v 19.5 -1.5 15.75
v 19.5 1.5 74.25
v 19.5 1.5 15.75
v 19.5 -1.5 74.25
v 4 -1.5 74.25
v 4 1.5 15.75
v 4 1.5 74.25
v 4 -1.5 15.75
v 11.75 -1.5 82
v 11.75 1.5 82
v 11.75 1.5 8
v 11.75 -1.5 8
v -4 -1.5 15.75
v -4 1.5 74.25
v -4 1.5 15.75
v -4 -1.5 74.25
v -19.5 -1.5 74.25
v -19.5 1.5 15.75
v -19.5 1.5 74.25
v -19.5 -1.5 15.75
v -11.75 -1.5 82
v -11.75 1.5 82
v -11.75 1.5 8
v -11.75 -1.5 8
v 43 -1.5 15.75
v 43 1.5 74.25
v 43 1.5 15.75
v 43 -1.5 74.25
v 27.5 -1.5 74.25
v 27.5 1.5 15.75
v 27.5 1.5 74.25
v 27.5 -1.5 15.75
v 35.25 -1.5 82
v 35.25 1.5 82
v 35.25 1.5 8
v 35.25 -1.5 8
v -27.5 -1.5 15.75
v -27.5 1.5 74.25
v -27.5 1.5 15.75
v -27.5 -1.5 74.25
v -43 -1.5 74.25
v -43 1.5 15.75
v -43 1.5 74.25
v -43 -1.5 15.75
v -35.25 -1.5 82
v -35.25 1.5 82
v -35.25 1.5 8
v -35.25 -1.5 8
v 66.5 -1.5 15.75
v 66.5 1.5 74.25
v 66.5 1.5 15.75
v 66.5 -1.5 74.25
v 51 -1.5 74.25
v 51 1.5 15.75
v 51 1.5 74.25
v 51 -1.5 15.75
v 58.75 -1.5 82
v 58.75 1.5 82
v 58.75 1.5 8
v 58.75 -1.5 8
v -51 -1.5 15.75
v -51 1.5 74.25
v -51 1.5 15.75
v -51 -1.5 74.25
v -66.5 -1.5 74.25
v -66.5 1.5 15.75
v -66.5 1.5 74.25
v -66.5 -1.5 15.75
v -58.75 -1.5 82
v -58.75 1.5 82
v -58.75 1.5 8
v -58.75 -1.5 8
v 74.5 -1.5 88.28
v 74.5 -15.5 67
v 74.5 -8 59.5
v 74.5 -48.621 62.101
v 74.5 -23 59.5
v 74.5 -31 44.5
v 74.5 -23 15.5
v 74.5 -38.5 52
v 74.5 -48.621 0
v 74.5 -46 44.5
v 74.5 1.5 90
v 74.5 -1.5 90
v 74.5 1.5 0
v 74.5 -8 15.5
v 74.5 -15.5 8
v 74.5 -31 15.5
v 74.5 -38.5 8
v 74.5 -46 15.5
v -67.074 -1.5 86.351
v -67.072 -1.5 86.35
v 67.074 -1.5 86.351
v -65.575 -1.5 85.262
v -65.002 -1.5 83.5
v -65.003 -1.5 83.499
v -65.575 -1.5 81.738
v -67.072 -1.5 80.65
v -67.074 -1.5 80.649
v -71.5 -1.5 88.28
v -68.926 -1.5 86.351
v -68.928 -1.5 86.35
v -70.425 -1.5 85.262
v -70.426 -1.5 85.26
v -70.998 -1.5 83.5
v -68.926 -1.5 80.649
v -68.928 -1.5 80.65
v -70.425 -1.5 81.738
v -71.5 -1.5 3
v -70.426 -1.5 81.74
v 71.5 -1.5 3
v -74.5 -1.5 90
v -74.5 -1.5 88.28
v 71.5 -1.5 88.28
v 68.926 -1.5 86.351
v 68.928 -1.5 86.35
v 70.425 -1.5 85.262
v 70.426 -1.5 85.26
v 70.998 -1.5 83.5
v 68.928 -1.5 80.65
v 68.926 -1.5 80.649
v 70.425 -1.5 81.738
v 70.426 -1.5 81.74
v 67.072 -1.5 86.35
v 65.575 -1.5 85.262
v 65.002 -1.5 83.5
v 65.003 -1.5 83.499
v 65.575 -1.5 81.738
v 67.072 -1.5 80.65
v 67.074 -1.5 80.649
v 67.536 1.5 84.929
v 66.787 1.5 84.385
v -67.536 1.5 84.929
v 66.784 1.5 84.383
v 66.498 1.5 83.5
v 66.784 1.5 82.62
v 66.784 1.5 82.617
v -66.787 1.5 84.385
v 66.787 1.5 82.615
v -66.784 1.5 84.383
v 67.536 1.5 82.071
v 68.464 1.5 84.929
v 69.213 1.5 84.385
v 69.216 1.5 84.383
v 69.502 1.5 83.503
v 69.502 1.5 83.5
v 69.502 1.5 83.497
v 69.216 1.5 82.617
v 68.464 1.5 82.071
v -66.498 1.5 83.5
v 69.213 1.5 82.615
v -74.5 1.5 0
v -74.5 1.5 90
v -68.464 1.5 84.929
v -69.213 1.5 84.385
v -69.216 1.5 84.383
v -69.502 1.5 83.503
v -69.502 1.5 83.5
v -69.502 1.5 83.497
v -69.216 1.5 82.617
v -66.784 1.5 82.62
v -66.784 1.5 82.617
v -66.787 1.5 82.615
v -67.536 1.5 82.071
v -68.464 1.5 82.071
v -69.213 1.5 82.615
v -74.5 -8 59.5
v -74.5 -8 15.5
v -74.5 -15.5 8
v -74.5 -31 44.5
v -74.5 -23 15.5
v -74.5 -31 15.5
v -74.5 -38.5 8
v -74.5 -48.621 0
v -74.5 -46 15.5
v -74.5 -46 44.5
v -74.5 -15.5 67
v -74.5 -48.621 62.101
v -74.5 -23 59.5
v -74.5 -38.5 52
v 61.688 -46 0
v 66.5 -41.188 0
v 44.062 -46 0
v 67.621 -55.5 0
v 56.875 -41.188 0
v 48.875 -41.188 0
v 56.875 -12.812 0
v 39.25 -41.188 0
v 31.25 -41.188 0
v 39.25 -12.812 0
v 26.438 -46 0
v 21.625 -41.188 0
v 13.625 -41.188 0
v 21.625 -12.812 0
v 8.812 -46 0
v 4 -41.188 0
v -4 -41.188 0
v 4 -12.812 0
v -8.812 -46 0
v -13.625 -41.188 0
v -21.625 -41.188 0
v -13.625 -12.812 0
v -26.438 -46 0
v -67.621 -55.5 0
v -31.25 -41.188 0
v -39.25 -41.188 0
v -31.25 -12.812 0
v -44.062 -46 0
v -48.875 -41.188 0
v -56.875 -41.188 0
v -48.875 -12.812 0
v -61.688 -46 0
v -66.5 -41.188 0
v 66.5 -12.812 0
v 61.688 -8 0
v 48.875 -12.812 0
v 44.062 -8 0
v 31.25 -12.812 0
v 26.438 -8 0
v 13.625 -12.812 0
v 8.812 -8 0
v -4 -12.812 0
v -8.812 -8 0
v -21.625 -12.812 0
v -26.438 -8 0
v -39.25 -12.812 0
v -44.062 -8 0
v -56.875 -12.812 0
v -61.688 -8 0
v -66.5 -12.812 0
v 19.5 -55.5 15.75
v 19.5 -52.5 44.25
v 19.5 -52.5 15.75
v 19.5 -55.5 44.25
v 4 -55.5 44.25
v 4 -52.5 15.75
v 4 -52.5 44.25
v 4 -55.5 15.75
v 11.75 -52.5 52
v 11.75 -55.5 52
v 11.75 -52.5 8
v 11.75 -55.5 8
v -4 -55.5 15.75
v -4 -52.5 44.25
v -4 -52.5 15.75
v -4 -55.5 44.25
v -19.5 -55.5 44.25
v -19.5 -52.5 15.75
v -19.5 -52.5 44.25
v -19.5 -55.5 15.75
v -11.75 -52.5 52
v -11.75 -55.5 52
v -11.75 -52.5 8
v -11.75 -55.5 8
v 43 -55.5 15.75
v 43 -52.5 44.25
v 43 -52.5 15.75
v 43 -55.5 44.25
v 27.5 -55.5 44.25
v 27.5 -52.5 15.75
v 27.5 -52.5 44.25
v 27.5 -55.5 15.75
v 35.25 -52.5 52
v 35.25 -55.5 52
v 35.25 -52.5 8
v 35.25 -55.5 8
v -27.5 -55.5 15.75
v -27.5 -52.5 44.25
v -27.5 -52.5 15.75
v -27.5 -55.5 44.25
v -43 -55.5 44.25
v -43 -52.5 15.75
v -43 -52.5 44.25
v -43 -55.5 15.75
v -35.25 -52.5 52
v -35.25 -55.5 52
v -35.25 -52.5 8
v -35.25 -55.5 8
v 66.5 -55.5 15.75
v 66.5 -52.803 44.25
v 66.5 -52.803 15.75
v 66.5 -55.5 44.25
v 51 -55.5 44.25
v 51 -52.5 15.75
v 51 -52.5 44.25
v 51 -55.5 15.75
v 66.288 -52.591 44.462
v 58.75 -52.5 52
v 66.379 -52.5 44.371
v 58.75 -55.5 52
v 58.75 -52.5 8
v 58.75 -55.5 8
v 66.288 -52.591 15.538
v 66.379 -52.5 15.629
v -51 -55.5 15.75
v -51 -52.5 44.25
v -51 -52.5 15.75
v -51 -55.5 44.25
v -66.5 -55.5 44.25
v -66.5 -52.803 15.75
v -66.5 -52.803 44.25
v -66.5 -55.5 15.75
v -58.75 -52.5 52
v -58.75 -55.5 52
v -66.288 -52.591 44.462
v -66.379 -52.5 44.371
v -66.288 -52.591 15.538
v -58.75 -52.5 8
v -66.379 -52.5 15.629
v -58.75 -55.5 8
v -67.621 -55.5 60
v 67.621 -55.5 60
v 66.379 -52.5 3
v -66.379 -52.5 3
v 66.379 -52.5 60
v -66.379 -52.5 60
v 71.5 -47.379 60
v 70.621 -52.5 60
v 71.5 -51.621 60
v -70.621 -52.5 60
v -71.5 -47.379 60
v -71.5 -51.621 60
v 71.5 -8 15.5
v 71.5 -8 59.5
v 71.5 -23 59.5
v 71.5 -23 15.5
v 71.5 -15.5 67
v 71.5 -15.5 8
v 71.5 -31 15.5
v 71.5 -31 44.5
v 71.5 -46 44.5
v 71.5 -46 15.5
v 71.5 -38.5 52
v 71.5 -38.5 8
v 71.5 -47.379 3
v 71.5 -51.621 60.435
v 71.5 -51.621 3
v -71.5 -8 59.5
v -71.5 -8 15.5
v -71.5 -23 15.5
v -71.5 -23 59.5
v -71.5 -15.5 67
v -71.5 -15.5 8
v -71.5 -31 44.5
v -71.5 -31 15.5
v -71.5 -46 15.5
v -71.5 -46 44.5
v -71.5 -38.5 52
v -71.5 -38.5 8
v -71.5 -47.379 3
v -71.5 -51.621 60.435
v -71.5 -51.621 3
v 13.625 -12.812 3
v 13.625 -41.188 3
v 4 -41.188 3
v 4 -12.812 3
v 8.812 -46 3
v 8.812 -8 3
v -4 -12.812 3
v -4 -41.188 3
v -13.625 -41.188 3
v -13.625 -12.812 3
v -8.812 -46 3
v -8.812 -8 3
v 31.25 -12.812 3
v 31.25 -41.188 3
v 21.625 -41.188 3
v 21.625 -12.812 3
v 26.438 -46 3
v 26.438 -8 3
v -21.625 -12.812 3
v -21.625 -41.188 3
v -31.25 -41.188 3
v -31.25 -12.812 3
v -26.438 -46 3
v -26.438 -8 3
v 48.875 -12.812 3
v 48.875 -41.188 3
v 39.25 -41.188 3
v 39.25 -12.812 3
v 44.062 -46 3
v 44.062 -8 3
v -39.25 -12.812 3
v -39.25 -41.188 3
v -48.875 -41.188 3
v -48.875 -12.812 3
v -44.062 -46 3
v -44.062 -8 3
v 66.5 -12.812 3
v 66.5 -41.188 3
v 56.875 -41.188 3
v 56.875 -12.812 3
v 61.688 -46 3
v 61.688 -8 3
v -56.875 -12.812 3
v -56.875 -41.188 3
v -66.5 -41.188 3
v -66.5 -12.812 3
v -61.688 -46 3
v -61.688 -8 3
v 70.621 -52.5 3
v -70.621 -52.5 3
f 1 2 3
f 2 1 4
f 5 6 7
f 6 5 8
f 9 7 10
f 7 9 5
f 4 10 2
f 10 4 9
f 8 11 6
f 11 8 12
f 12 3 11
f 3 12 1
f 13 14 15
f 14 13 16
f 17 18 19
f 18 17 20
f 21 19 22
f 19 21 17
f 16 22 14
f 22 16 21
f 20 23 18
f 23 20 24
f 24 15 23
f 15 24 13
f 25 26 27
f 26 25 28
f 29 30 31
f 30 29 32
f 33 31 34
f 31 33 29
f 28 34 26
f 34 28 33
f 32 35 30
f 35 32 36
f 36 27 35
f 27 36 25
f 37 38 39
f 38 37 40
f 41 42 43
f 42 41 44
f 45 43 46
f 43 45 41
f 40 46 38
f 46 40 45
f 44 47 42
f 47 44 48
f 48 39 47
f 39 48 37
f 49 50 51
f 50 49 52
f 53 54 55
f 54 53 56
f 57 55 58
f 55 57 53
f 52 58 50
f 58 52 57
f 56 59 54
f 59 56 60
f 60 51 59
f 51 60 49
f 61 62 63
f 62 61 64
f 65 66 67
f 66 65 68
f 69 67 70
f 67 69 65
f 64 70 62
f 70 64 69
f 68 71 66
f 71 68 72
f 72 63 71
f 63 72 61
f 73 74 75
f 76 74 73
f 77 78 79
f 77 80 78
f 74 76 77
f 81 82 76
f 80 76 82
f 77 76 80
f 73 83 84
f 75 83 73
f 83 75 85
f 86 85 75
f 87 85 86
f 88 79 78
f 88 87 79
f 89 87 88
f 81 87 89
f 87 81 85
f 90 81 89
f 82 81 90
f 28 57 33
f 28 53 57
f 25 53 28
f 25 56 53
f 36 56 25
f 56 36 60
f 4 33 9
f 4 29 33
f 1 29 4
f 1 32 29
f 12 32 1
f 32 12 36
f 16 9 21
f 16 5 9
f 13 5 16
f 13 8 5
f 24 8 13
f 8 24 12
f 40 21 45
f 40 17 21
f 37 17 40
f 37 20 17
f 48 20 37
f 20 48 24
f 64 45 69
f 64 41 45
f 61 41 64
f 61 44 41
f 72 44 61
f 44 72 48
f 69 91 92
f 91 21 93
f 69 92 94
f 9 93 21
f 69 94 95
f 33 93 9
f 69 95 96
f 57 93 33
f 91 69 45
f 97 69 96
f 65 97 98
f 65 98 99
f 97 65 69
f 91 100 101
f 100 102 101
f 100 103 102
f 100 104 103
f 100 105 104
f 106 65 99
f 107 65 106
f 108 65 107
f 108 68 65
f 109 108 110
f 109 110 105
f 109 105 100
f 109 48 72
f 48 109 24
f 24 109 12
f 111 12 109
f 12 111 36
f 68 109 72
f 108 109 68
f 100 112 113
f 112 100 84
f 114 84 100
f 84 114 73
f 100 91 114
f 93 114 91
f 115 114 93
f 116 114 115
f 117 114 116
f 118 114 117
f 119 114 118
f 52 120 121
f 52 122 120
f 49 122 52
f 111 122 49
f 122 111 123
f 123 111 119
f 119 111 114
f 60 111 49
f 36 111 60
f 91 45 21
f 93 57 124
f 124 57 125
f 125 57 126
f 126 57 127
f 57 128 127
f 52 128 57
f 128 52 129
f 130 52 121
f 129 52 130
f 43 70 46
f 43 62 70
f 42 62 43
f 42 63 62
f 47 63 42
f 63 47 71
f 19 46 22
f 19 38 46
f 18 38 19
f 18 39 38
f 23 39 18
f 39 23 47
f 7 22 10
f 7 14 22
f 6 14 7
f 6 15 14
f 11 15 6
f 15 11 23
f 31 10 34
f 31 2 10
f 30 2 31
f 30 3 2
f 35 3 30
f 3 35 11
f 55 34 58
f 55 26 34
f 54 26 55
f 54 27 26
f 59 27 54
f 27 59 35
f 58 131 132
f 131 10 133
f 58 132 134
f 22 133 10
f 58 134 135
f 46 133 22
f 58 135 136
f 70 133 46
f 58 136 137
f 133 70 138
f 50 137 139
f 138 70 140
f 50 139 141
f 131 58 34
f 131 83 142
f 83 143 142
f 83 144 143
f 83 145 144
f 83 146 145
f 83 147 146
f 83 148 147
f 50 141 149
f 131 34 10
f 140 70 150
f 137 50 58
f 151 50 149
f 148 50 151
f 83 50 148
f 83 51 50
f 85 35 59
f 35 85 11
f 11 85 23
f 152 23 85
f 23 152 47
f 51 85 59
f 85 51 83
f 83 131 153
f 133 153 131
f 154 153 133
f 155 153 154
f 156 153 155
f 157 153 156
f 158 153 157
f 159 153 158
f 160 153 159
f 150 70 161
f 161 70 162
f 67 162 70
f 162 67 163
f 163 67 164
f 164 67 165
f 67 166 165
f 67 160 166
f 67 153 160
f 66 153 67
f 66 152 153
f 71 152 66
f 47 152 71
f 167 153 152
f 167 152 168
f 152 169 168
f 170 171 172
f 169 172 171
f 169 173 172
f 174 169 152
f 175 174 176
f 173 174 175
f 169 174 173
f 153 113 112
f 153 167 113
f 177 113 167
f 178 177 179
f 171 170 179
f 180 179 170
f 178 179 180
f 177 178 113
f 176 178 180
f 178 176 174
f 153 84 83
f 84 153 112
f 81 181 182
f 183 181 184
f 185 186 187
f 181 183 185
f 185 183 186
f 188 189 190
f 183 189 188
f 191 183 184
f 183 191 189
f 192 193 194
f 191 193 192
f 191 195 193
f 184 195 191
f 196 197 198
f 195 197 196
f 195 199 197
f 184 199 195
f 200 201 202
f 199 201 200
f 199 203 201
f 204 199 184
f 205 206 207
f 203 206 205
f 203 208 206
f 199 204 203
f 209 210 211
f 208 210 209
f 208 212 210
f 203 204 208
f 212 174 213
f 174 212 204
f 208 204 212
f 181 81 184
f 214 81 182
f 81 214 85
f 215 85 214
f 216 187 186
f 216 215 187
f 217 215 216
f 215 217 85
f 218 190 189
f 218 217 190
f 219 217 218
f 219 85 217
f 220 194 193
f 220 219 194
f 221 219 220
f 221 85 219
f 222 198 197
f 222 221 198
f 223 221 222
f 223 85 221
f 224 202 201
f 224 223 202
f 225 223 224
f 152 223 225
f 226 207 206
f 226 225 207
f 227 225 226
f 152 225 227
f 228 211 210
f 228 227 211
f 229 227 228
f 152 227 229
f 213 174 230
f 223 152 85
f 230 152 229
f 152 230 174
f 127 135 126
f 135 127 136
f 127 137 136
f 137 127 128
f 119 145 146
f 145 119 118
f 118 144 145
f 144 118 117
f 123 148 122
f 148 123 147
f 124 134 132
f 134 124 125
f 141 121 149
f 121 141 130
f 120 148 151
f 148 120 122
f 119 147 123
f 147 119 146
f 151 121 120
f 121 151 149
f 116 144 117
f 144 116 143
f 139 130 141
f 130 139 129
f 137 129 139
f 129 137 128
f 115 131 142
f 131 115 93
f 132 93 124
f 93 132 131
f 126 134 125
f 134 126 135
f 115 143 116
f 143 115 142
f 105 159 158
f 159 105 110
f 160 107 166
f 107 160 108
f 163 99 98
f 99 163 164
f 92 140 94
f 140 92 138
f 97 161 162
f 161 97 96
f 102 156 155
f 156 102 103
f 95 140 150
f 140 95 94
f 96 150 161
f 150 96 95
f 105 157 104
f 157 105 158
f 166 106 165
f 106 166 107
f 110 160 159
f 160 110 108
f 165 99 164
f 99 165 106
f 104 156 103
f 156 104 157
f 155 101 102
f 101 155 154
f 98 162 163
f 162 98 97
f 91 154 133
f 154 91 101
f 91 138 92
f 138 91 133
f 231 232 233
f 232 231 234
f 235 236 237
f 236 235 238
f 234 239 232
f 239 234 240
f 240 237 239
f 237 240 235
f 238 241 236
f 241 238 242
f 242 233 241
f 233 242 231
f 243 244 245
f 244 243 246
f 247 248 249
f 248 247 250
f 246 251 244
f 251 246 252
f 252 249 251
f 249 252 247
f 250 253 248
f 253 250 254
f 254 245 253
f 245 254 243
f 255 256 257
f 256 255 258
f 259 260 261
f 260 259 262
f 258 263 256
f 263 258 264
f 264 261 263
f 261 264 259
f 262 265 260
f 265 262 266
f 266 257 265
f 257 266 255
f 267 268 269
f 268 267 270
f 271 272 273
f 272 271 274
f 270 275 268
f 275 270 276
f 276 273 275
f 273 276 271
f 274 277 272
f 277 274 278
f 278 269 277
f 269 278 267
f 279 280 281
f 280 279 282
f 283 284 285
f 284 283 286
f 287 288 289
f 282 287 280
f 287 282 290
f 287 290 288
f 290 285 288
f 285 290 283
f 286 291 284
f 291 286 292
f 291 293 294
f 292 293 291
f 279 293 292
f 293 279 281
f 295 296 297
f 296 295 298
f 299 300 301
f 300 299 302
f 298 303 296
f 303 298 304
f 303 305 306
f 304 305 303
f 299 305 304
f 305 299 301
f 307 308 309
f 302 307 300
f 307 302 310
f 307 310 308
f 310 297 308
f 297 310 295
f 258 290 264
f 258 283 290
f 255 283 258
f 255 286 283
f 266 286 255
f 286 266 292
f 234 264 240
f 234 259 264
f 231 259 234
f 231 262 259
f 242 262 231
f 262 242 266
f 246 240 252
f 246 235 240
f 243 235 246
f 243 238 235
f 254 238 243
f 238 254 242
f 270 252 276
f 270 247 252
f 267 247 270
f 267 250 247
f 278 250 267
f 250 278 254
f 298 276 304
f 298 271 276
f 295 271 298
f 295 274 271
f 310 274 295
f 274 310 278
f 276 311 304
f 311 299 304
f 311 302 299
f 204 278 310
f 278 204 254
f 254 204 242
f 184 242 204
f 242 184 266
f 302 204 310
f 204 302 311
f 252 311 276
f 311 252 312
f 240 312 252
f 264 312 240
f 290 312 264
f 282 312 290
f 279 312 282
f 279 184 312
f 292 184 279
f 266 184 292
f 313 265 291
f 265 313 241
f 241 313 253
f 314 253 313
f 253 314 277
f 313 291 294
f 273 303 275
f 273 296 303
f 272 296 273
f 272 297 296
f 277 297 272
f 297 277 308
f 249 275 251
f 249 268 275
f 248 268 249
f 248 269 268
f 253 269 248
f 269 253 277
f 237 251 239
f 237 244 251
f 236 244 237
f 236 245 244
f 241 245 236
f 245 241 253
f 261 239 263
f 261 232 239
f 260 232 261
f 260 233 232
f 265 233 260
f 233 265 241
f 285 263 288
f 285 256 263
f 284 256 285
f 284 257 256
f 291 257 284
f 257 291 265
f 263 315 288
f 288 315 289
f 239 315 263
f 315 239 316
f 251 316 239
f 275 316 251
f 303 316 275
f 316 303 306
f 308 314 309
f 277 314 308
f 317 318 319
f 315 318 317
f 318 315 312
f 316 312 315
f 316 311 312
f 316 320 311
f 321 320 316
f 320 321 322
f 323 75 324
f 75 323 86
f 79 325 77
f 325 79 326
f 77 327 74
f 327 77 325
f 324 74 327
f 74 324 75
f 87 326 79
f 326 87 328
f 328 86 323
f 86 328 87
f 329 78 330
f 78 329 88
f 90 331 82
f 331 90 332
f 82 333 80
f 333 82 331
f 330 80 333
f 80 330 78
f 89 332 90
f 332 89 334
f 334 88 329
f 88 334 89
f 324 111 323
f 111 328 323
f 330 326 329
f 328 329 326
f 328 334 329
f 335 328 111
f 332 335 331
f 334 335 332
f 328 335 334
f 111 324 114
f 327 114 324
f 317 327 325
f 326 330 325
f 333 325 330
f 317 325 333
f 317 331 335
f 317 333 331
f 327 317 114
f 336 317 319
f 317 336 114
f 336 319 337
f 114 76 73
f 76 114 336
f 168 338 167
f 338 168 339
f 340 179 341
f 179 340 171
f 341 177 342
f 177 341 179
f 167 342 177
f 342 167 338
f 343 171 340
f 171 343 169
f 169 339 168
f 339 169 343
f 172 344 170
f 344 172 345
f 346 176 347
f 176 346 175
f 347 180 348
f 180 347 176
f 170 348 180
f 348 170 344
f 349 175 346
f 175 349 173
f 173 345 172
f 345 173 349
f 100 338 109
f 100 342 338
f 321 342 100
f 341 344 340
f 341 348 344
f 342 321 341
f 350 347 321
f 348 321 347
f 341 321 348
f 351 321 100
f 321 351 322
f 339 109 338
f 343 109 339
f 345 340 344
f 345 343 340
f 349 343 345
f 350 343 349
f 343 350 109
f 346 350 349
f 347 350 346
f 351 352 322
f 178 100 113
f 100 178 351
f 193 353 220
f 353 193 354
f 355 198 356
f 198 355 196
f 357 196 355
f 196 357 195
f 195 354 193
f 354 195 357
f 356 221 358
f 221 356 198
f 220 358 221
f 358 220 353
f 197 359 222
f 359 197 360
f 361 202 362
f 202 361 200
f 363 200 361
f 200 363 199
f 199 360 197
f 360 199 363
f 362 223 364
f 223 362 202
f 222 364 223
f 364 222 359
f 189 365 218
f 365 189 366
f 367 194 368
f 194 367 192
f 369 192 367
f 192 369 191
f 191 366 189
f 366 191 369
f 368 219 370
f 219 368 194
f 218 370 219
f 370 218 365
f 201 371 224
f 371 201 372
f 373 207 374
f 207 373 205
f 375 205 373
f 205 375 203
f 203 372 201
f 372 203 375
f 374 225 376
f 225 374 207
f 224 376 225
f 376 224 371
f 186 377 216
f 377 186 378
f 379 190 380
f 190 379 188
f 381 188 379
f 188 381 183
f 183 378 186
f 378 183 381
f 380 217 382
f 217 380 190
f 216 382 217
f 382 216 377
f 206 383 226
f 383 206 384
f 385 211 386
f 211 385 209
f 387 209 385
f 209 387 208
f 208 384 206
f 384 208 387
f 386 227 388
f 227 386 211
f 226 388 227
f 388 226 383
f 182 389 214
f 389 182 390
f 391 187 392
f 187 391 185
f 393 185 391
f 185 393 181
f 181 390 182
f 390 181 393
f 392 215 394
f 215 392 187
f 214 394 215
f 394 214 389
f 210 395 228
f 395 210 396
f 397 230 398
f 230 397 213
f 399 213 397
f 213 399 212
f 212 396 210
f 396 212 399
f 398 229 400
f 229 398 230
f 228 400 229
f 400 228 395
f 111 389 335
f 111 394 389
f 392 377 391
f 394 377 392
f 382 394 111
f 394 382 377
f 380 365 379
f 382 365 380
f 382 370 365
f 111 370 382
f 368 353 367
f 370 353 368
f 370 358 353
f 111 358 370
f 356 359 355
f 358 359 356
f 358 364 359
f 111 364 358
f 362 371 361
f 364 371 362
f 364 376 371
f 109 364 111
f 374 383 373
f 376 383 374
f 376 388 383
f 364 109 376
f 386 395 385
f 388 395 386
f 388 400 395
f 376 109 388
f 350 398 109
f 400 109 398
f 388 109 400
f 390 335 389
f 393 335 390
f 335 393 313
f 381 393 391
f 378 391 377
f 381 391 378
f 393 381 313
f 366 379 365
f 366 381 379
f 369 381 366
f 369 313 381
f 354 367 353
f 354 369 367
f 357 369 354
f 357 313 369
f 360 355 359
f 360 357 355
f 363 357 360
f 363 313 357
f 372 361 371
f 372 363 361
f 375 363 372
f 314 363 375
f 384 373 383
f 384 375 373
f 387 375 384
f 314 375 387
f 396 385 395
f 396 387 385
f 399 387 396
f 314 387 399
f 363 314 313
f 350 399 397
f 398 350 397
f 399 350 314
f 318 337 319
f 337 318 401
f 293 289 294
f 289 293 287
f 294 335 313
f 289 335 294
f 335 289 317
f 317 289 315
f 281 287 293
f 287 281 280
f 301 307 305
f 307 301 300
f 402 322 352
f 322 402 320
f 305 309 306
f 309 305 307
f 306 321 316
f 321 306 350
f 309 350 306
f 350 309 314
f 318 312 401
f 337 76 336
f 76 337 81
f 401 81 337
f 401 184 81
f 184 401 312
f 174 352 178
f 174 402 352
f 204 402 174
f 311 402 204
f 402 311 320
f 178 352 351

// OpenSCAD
module spice_rack()
{
    inner_length = 143;
    inner_depth = 48;
    height = 60;
    back_height = 90;
    wall_thinkness = 3;
    bottom_thickness = 5;
    screw_d =3;
    
    module wall(length,width,thickness,slat_thickness,num_cutout_pairs)
    {
        wall_segments = slat_thickness * (1+2*num_cutout_pairs);
        length_cutout = (length-wall_segments)/(2*num_cutout_pairs);
        module cutout(c_width,c_height)
        {
            width_2 = c_width * sqrt(2) / 2;
            translate([0,0,0]) cube([c_width,c_height-c_width-slat_thickness*2,thickness+.1], center = true);
            translate([0,c_height/2-c_width/2-slat_thickness,0]) rotate([0,0,45]) cube([width_2,width_2,thickness+.1], center = true);
            translate([0,-(c_height/2-c_width/2-slat_thickness),0]) rotate([0,0,45]) cube([width_2,width_2,thickness+.1], center = true);
        }
        difference()
        {
            cube([length,width,thickness],center=true);
            for( i=[1:num_cutout_pairs])
            {
                translate([(i-1)*(length_cutout+slat_thickness)+(length_cutout+slat_thickness)/2,0,0]) cutout(length_cutout,width);
                translate([-(i-1)*(length_cutout+slat_thickness)-(length_cutout+slat_thickness)/2,0,0]) cutout(length_cutout,width);
            }
        }
    }
    module side_wall(length,width,width1,thickness,slat_thickness)
    {
        wall_segments = slat_thickness * (1+2);
        length_cutout = (length-wall_segments)/(2);
        module cutout(c_width,c_height)
        {
            width_2 = c_width * sqrt(2) / 2;
            translate([0,0,0]) cube([c_width,c_height-c_width-slat_thickness*2,thickness+.1], center = true);
            translate([0,c_height/2-c_width/2-slat_thickness,0]) rotate([0,0,45]) cube([width_2,width_2,thickness+.1], center = true);
            translate([0,-(c_height/2-c_width/2-slat_thickness),0]) rotate([0,0,45]) cube([width_2,width_2,thickness+.1], center = true);
        }
        difference()
        {
            translate([0,(width1-width)/2,0]) cube([length,width1,thickness],center=true);
            translate([0,width+(width1-width)/2,0]) rotate([0,0,atan2((width1-width),length)]) cube([length*2,length,thickness+0.1],center=true);
            average_width = (width1+width)/2;
                translate([(length_cutout+slat_thickness)/2,(width1-width)*2/8,0]) cutout(length_cutout,average_width);
                translate([-(length_cutout+slat_thickness)/2,0,0]) cutout(length_cutout,width);
        }
    }
    
    union()
    {
        difference()
        {
            // back wall
            translate([0,back_height/2,0]) wall(inner_length+wall_thinkness*2,back_height,wall_thinkness,8,3);
            screw_offset = 5;
            // screw holes
            translate([(inner_length+wall_thinkness)/2-screw_offset,back_height-wall_thinkness/2-screw_offset,0]) cylinder(wall_thinkness+0.01,screw_d/2,screw_d,center=true);
            translate([-((inner_length+wall_thinkness)/2-screw_offset),back_height-wall_thinkness/2-screw_offset,0]) cylinder(wall_thinkness+0.01,screw_d/2,screw_d,center=true);
        }
        difference()
        {
            corner_offset = 1.5;
            union()
            {
                // front wall
                translate([0,height/2,inner_depth+wall_thinkness*2]) wall(inner_length+wall_thinkness*2,height,wall_thinkness,8,3);
                // corner additions for cutouts
                translate([inner_length/2-corner_offset,height/2,inner_depth+wall_thinkness*3/2-corner_offset]) rotate([0,45,0]) cube([wall_thinkness*2.5,height,wall_thinkness], center = true);
                translate([-(inner_length/2-corner_offset),height/2,inner_depth+wall_thinkness*3/2-corner_offset]) rotate([0,-45,0]) cube([wall_thinkness*2.5,height,wall_thinkness], center = true);
                // side walls
                translate([inner_length/2+wall_thinkness/2,height/2,inner_depth/2+wall_thinkness]) rotate([0,90,0]) side_wall(inner_depth+wall_thinkness*2,height,back_height,wall_thinkness,8);
                translate([-(inner_length/2+wall_thinkness/2),height/2,inner_depth/2+wall_thinkness]) rotate([0,90,0]) side_wall(inner_depth+wall_thinkness*2,height,back_height,wall_thinkness,8);
                // bottom
                translate([0,wall_thinkness/2,inner_depth/2+wall_thinkness]) rotate([90,0,0]) wall(inner_length+wall_thinkness*2,inner_depth+wall_thinkness*2,wall_thinkness,8,4);
            }
            // corner cutouts
            translate([inner_length/2-corner_offset,height/2,inner_depth+wall_thinkness*3/2-corner_offset]) rotate([0,45,0]) translate([0,0,wall_thinkness*3/2]) cube([wall_thinkness*4,height+10,wall_thinkness*2], center = true);
            // corner cutouts
            translate([-(inner_length/2-corner_offset),height/2,inner_depth+wall_thinkness*3/2-corner_offset]) rotate([0,-45,0]) translate([0,0,wall_thinkness*3/2]) cube([wall_thinkness*4,height+10,wall_thinkness*2], center = true);
        }
    }
}

rotate([90,0,0]) spice_rack();
